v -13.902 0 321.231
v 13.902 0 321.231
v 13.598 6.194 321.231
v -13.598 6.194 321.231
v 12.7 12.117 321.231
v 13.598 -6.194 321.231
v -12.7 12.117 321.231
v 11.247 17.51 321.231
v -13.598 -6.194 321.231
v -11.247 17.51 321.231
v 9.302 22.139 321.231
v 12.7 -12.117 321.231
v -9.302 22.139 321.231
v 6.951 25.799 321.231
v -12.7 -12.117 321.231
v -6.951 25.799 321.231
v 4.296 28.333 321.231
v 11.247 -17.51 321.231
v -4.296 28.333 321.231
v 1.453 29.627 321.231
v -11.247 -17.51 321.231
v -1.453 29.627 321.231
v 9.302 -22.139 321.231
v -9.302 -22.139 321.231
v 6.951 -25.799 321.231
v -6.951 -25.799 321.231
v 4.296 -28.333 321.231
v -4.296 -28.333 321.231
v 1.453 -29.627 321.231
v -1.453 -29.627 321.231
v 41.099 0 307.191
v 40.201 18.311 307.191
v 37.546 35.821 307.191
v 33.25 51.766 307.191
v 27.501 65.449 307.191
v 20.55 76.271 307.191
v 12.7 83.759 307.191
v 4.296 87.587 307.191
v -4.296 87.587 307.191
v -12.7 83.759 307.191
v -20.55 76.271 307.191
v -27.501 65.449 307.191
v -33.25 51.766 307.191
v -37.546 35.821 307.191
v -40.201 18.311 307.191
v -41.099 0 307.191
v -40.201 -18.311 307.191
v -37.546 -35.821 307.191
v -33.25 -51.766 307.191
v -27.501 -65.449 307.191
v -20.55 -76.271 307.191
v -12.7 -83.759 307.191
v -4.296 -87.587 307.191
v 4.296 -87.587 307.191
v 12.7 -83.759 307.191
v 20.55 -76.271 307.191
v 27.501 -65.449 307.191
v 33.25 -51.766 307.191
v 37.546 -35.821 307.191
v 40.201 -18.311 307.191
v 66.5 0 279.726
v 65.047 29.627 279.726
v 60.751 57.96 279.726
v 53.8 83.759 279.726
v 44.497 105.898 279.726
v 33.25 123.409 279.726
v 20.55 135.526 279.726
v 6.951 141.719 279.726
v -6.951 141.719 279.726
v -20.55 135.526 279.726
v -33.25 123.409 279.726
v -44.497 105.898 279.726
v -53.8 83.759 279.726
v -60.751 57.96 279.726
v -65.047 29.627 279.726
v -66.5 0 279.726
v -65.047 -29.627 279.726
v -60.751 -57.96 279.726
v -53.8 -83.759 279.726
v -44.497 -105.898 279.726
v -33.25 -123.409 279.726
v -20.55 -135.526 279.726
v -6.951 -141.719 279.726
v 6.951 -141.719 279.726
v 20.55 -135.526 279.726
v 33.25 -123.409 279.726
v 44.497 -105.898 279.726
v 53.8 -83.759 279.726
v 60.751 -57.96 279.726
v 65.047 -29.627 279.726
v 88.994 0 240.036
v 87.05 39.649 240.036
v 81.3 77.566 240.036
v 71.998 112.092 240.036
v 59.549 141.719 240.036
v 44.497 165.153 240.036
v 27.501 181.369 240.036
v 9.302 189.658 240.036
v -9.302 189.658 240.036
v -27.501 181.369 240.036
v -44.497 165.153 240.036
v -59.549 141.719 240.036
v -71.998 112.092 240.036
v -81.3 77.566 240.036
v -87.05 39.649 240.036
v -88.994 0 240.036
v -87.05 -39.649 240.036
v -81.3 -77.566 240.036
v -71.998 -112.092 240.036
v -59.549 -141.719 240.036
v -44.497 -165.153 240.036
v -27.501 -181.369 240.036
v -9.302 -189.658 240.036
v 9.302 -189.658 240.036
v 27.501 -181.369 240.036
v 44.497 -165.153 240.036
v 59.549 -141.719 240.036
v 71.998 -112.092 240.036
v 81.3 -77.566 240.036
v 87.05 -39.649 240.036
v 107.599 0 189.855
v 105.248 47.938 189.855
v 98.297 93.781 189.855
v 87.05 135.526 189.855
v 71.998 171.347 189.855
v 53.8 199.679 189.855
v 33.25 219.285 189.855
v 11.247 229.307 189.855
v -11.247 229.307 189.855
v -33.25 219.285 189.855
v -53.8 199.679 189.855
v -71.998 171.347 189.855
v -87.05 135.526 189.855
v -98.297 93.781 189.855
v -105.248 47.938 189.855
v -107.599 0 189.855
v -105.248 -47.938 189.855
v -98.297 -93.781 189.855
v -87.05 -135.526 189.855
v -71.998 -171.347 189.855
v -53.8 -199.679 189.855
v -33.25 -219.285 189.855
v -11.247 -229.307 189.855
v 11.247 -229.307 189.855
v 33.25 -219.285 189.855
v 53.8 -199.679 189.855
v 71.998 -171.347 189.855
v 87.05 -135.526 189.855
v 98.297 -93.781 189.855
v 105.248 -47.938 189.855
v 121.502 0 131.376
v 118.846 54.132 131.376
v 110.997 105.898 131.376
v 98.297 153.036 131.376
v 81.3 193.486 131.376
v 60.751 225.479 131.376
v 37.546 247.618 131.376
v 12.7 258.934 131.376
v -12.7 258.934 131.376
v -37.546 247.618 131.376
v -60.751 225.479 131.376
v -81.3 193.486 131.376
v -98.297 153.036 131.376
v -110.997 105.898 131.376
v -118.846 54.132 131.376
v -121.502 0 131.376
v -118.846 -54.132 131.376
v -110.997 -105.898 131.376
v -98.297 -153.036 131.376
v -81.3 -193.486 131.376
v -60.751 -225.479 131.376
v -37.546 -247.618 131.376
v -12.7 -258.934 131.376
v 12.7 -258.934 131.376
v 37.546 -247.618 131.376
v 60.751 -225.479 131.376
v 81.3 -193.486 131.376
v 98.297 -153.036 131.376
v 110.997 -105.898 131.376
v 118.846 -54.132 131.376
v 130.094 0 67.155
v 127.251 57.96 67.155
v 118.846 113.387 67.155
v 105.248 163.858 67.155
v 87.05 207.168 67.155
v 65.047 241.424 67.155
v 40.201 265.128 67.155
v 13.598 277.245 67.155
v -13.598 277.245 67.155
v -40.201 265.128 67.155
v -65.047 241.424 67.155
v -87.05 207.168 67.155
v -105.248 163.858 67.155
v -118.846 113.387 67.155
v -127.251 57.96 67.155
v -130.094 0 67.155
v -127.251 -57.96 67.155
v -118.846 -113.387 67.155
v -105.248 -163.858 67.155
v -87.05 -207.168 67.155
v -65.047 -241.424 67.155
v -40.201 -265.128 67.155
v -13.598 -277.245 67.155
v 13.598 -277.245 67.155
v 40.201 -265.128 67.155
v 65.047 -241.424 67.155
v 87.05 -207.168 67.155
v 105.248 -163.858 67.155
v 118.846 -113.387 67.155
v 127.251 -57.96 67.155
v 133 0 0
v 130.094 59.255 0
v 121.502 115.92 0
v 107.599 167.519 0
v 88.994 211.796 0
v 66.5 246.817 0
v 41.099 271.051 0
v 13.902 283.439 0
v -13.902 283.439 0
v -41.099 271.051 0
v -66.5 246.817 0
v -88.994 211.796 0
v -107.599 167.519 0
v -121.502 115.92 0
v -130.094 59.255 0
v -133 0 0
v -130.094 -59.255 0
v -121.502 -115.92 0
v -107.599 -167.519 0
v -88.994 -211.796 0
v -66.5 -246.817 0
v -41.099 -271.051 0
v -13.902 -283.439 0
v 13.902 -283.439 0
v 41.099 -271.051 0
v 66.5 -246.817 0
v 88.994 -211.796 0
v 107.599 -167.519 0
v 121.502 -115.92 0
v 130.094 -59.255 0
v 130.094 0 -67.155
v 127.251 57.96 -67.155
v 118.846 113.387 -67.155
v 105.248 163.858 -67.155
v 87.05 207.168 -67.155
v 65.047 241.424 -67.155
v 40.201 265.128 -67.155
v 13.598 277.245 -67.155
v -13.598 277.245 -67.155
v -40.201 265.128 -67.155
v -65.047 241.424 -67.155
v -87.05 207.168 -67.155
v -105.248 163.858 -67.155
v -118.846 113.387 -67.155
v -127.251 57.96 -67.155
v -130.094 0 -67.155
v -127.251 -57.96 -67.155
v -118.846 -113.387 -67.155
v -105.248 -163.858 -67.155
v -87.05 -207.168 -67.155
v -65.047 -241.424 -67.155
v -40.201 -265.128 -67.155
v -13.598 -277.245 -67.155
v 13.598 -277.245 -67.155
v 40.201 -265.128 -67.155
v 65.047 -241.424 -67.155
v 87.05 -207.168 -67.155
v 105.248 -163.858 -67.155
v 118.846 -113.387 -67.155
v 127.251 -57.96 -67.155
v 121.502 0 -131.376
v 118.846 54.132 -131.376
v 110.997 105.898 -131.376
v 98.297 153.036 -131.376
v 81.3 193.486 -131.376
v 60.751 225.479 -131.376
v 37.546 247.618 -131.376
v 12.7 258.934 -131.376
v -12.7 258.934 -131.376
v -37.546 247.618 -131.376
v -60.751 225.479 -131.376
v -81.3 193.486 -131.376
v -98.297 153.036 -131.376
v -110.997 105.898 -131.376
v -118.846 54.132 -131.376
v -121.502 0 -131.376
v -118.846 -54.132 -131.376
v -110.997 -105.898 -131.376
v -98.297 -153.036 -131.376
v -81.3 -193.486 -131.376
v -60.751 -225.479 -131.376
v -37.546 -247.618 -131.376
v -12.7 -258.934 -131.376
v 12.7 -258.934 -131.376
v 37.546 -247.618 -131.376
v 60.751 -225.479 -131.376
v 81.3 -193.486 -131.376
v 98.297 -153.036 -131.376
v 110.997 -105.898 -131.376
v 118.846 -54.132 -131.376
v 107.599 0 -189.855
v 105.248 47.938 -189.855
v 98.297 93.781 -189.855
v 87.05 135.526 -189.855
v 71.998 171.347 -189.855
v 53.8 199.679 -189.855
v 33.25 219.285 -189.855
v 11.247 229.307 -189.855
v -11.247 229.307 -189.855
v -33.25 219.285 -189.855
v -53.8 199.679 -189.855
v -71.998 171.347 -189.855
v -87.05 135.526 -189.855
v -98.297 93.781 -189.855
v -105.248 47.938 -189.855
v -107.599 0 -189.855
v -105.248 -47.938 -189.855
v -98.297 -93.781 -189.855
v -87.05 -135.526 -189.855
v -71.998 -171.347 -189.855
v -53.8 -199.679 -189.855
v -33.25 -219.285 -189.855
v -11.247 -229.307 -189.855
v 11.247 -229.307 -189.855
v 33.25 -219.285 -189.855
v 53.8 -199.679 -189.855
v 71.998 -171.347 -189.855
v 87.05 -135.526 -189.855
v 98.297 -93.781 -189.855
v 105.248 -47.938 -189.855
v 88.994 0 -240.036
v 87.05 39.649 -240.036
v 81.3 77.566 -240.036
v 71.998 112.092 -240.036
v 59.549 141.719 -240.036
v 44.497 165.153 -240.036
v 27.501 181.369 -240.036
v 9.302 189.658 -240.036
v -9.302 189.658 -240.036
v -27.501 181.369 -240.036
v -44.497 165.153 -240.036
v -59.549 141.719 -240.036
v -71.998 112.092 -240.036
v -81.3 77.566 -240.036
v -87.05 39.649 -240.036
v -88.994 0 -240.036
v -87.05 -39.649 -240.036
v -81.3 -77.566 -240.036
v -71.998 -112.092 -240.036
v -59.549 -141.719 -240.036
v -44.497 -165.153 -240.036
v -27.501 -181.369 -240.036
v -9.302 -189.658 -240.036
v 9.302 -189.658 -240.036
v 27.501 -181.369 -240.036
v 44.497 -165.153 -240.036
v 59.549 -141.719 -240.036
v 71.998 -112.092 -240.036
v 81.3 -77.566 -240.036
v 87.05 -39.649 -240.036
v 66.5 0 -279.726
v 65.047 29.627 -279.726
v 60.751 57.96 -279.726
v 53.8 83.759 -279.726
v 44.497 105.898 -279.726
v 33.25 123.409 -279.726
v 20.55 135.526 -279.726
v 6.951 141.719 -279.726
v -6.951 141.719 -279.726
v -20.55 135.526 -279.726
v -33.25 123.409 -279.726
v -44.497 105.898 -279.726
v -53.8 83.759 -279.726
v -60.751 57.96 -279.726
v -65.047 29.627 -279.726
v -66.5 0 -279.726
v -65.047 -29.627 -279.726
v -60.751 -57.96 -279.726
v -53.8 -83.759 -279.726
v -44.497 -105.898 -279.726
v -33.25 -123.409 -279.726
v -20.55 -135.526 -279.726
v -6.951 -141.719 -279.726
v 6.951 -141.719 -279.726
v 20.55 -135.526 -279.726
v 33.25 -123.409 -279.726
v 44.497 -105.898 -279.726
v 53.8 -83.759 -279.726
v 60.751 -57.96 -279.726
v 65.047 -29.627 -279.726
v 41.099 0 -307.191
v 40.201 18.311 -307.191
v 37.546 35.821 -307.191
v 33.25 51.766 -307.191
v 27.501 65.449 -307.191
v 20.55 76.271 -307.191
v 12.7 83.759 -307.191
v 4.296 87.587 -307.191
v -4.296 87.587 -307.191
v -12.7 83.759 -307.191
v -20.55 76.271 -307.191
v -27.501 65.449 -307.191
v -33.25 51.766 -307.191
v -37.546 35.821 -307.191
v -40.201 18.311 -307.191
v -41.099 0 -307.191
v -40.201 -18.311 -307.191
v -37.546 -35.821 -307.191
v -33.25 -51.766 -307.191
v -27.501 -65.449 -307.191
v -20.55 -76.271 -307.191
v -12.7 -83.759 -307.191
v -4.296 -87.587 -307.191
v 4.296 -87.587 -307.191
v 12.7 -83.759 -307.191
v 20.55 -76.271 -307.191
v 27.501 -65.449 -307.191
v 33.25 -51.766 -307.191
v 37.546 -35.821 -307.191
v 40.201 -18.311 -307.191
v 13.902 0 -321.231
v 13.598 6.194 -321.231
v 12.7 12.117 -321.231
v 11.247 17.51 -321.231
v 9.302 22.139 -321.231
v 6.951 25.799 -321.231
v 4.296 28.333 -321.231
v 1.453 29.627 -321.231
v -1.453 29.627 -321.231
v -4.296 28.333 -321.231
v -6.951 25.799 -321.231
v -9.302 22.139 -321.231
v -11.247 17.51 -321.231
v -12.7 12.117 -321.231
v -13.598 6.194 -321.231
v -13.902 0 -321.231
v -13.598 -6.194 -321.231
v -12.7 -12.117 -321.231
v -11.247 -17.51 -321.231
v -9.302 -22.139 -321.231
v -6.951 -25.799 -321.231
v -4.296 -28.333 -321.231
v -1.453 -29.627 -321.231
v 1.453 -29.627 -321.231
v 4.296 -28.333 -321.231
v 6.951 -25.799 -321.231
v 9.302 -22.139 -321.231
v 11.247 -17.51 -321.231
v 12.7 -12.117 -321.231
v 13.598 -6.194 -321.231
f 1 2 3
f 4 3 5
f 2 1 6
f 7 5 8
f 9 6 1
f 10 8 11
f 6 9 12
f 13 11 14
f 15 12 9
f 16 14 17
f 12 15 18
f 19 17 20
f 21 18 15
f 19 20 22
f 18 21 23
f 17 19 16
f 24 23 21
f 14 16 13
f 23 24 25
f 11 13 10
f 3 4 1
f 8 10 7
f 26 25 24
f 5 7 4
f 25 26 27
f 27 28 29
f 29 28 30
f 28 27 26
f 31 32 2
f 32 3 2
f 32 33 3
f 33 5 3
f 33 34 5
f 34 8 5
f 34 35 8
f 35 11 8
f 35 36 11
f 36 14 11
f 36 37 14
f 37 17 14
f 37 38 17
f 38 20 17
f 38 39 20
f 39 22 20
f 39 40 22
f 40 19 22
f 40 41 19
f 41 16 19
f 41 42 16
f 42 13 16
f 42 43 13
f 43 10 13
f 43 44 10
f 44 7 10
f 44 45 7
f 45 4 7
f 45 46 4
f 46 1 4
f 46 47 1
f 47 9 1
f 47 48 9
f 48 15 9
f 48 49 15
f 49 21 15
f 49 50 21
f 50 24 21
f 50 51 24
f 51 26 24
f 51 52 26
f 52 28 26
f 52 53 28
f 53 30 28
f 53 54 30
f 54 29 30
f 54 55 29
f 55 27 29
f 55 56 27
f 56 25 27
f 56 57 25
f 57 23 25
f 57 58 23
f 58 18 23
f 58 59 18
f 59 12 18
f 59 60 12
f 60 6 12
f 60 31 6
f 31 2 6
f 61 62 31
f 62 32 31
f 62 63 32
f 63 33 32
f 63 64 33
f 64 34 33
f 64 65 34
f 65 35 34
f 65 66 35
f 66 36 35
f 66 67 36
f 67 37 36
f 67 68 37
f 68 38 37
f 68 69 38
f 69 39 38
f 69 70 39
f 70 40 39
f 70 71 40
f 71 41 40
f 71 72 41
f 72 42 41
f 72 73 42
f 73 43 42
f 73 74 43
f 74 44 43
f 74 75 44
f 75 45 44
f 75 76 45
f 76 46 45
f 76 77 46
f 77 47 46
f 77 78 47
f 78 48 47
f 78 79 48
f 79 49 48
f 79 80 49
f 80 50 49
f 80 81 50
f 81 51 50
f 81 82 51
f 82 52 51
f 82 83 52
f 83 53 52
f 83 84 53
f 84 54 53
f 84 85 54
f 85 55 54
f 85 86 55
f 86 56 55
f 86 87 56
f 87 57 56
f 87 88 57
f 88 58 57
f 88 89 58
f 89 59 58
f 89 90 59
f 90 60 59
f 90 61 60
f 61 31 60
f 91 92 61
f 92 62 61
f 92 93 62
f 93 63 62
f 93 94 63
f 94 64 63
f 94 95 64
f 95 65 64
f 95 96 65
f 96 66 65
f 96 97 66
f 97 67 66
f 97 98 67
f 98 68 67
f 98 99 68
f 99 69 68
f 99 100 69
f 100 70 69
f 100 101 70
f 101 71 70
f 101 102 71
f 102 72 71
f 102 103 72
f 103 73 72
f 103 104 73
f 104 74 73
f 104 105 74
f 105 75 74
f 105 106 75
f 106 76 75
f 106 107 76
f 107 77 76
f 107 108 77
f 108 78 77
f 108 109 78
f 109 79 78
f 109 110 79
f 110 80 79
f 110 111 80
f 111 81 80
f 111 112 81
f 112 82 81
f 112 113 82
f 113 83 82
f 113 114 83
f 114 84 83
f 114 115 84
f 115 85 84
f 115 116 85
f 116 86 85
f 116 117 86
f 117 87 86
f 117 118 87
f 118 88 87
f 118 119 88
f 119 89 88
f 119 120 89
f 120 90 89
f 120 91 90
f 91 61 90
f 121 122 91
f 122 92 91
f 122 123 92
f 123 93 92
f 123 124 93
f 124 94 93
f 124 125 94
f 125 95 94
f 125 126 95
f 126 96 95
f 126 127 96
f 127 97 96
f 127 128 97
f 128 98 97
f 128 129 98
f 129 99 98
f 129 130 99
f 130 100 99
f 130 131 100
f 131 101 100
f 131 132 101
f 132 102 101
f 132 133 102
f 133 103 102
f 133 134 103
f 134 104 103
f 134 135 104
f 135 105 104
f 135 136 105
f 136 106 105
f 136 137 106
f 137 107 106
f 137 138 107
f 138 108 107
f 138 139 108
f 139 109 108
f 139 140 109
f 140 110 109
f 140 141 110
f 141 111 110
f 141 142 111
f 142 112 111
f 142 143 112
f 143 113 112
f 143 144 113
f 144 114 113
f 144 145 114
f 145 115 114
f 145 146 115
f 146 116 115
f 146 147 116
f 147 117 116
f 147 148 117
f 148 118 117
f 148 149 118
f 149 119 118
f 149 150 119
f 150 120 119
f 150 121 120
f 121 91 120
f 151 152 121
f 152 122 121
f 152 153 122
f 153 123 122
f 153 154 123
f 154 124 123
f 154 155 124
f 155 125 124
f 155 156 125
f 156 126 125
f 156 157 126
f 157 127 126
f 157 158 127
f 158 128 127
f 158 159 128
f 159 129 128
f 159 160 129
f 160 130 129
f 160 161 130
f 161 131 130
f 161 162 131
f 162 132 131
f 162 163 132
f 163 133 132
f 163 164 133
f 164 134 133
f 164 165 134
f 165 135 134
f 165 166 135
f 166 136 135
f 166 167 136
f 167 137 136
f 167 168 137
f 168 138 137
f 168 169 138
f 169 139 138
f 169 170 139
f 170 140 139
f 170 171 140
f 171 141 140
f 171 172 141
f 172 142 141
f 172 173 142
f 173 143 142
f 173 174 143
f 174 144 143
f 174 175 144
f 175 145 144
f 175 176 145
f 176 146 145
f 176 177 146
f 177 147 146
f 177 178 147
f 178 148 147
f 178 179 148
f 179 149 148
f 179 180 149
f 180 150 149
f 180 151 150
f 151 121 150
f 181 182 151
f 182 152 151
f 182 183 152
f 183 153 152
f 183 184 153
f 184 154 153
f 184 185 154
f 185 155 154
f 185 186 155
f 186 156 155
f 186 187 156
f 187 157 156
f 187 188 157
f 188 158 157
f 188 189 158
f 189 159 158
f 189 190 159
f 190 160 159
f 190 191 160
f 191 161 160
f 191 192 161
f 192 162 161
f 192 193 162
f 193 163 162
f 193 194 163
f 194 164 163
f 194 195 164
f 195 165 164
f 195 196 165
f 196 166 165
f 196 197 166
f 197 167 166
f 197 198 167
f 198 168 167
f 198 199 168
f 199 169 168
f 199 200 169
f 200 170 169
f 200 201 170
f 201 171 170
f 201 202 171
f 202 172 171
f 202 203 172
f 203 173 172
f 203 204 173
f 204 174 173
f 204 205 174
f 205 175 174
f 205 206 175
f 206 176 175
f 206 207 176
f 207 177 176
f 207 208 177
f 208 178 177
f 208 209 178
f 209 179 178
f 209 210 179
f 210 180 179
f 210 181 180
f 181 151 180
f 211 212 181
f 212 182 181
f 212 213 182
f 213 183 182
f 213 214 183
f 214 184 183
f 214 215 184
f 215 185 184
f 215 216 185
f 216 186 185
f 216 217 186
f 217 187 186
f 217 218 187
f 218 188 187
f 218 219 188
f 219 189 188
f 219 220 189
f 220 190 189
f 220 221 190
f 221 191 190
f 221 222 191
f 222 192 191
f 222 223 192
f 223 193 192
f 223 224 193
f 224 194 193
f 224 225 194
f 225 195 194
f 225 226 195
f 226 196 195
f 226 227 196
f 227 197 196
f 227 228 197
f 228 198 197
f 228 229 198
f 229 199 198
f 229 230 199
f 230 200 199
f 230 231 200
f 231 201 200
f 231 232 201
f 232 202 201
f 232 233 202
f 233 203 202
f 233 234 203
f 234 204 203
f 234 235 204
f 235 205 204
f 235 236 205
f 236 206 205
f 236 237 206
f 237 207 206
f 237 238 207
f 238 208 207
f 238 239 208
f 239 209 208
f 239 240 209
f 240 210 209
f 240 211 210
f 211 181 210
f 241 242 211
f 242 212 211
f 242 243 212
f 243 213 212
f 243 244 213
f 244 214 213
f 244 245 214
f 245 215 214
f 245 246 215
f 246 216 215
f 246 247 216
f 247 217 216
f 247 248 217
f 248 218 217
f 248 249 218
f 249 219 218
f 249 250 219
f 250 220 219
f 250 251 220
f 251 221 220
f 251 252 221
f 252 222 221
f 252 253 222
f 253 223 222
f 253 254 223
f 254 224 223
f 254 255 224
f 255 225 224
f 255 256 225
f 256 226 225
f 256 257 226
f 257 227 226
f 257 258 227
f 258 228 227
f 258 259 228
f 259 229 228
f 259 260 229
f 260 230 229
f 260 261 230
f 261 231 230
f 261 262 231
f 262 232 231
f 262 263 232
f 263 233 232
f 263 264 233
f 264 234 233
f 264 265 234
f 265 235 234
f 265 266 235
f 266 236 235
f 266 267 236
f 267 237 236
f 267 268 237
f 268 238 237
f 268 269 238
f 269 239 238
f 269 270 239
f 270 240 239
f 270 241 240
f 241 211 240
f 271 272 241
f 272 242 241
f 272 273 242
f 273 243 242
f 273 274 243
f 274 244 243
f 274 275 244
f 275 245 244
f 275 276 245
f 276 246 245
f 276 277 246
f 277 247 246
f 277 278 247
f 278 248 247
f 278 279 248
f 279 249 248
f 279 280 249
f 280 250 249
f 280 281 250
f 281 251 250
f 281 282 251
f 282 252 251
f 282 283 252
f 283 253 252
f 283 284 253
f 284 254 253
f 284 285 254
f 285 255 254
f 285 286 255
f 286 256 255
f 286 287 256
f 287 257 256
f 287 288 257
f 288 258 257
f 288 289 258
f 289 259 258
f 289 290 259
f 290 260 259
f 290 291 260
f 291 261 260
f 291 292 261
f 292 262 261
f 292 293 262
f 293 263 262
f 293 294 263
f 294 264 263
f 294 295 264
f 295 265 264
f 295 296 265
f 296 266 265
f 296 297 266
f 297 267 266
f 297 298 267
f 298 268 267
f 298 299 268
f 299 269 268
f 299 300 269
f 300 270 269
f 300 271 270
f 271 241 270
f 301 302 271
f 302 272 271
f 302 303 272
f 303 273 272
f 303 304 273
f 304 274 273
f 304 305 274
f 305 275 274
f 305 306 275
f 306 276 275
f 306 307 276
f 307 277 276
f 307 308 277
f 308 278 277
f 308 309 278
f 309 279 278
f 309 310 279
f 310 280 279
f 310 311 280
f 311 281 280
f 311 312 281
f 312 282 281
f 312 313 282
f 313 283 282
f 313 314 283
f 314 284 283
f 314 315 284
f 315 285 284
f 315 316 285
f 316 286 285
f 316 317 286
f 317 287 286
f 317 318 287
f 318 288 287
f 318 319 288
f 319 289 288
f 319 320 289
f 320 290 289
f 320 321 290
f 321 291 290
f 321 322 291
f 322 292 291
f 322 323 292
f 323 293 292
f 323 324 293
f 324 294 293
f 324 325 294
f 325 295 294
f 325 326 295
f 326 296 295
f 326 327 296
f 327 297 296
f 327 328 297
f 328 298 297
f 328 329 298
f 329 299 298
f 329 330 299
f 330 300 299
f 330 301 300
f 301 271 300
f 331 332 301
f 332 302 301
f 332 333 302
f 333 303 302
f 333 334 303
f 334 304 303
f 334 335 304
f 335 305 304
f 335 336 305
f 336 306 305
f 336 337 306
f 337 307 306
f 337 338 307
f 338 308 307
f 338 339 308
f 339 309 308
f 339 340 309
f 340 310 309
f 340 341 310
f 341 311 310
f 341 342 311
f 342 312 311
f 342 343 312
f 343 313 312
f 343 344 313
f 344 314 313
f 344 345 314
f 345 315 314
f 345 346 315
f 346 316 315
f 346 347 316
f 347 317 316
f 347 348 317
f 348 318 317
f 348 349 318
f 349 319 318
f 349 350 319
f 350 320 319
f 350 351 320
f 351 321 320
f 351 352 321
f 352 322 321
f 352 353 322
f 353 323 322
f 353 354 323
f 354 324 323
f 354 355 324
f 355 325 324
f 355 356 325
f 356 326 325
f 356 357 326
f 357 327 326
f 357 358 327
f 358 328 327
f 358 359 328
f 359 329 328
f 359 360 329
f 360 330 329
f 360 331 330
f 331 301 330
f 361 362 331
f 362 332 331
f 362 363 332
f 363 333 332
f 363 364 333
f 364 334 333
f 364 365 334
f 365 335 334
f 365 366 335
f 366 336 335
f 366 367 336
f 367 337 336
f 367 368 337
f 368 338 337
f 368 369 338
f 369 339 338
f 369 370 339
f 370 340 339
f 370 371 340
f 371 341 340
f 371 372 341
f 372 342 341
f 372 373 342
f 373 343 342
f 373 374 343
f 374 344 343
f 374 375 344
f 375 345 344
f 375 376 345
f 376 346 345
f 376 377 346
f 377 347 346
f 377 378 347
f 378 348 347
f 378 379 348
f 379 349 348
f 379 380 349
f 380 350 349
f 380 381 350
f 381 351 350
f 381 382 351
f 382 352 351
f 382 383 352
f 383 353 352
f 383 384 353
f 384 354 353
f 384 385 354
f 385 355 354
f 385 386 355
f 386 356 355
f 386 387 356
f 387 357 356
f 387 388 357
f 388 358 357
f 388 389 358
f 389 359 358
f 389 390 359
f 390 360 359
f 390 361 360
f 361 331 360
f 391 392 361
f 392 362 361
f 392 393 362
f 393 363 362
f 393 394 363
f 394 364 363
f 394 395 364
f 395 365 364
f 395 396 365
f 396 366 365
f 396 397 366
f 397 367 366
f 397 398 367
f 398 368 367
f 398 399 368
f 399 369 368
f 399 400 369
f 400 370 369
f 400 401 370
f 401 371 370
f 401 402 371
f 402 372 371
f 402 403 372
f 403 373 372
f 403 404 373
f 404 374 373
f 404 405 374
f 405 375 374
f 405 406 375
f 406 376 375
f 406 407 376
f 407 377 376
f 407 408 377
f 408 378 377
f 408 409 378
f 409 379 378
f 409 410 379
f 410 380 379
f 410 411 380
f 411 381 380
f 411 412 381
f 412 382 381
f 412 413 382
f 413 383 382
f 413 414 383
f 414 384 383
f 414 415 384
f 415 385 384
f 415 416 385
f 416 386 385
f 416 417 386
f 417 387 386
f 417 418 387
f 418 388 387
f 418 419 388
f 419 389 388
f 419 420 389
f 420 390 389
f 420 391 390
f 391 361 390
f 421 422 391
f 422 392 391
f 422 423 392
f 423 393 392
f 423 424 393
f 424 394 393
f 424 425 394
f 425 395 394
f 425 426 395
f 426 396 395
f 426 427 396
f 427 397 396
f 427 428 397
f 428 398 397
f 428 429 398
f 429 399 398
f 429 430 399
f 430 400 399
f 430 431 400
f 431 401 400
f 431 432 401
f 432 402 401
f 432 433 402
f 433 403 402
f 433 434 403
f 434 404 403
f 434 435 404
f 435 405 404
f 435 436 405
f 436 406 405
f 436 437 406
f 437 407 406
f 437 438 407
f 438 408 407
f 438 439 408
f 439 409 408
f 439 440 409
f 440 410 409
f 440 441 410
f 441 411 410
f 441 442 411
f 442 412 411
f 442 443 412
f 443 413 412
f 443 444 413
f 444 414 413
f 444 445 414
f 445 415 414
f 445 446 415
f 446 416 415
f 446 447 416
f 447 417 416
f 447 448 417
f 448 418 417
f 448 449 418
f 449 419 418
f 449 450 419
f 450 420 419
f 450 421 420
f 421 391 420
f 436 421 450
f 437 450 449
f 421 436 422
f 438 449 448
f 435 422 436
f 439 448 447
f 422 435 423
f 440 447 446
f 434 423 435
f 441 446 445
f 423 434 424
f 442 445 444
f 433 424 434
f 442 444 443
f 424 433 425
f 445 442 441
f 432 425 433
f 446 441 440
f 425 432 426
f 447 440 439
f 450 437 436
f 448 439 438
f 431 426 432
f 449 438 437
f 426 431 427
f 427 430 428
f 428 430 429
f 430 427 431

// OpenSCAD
// Generated by SolidPython 1.0.1 on 2020-07-29 00:46:48


scale(v = [7, 15, 17]) {
	sphere(r = 19);
}
/***********************************************
*********      SolidPython code:      **********
************************************************
 
# import packages: SolidPython
from solid import *
from solid.utils import *
from itertools import chain, combinations, permutations


class Resize:

    def __init__(self, scad_file):
        self.scad_file = scad_file
        #self.scad_file = import_scad(scad_file)
        # cone/cylinder param:
        self.r1 = 0
        self.r2 = 0
        self.h = 0
        # rectangular prism param:
        self.w = 0
        self.l = 0
        # ellipse param:
        self.r = 0

    # import OpenScad code (file name corresponds to shape)


    # classify shape + parameters
    def assign(self, param1, param2, param3):
        if self.scad_file == 'cone.scad':
            self.r1 = param1
            self.r2 = param2
            self.h = param3
        elif self.scad_file == 'cylinder.scad':
            self.r1 = param1
            self.r2 = param2
            self.h = param3
        elif self.scad_file == 'rectangularPrism.scad':
            self.h = param1
            self.l = param2
            self.w = param3
        else:
            self.r = param1
            self.h = param2

    # resize parameters
    def iterate(self):
        x = range(3, 20, 2)
        i = 1
        if self.scad_file == 'cone.scad':
            tempList = list(permutations(x, 2))
            for temp in tempList:
                param1 = temp[0]
                param2 = temp[1]
                filepath = 'produced_scad_files/' + 'cone' + str(param1) + '_' + str(param2) + '_' + '.scad'
                scad_render_to_file(cylinder(h=param1, r1=param2, r2=0), filepath)

        elif self.scad_file == 'cylinder.scad':
            tempList = list(permutations(x, 3))
            for temp in tempList:
                param1 = temp[0]
                param2 = temp[1]
                filepath = 'produced_scad_files/' + 'cylinder' + str(param1) + '_' + str(param2) + '_' + '.scad'
                scad_render_to_file(cylinder(h=param1, r1=param2, r2=param2), filepath)

        elif self.scad_file == 'rectangularPrism.scad':
            tempList = list(permutations(x, 3))
            for temp in tempList:
                param1 = temp[0]
                param2 = temp[1]
                param3 = temp[2]
                filepath = 'produced_scad_files/' + 'rectangularPrism' + str(param1) + '_' + str(param2) + '_' + str(
                    param3) + '.scad'
                scad_render_to_file(cube(size=(param1, param2, param3)), filepath)

        elif self.scad_file == 'ellipse.scad':
            tempList = list(permutations(x, 4))
            for temp in tempList:
                param1 = temp[0]
                param2 = temp[1]
                param3 = temp[2]
                param4 = temp[3]
                filepath = 'produced_scad_files/' + 'ellipse' + str(param1) + '_' + str(param2) + '_' + str(param3) + '_' + str(param4) + '.scad'
                scad_render_to_file(scale([param1, param2, param3])(sphere(r=param4)), filepath)

    def render_to_scadfile(self):
        scad_render_to_file(scad, 'example.scad') 
 
************************************************/
